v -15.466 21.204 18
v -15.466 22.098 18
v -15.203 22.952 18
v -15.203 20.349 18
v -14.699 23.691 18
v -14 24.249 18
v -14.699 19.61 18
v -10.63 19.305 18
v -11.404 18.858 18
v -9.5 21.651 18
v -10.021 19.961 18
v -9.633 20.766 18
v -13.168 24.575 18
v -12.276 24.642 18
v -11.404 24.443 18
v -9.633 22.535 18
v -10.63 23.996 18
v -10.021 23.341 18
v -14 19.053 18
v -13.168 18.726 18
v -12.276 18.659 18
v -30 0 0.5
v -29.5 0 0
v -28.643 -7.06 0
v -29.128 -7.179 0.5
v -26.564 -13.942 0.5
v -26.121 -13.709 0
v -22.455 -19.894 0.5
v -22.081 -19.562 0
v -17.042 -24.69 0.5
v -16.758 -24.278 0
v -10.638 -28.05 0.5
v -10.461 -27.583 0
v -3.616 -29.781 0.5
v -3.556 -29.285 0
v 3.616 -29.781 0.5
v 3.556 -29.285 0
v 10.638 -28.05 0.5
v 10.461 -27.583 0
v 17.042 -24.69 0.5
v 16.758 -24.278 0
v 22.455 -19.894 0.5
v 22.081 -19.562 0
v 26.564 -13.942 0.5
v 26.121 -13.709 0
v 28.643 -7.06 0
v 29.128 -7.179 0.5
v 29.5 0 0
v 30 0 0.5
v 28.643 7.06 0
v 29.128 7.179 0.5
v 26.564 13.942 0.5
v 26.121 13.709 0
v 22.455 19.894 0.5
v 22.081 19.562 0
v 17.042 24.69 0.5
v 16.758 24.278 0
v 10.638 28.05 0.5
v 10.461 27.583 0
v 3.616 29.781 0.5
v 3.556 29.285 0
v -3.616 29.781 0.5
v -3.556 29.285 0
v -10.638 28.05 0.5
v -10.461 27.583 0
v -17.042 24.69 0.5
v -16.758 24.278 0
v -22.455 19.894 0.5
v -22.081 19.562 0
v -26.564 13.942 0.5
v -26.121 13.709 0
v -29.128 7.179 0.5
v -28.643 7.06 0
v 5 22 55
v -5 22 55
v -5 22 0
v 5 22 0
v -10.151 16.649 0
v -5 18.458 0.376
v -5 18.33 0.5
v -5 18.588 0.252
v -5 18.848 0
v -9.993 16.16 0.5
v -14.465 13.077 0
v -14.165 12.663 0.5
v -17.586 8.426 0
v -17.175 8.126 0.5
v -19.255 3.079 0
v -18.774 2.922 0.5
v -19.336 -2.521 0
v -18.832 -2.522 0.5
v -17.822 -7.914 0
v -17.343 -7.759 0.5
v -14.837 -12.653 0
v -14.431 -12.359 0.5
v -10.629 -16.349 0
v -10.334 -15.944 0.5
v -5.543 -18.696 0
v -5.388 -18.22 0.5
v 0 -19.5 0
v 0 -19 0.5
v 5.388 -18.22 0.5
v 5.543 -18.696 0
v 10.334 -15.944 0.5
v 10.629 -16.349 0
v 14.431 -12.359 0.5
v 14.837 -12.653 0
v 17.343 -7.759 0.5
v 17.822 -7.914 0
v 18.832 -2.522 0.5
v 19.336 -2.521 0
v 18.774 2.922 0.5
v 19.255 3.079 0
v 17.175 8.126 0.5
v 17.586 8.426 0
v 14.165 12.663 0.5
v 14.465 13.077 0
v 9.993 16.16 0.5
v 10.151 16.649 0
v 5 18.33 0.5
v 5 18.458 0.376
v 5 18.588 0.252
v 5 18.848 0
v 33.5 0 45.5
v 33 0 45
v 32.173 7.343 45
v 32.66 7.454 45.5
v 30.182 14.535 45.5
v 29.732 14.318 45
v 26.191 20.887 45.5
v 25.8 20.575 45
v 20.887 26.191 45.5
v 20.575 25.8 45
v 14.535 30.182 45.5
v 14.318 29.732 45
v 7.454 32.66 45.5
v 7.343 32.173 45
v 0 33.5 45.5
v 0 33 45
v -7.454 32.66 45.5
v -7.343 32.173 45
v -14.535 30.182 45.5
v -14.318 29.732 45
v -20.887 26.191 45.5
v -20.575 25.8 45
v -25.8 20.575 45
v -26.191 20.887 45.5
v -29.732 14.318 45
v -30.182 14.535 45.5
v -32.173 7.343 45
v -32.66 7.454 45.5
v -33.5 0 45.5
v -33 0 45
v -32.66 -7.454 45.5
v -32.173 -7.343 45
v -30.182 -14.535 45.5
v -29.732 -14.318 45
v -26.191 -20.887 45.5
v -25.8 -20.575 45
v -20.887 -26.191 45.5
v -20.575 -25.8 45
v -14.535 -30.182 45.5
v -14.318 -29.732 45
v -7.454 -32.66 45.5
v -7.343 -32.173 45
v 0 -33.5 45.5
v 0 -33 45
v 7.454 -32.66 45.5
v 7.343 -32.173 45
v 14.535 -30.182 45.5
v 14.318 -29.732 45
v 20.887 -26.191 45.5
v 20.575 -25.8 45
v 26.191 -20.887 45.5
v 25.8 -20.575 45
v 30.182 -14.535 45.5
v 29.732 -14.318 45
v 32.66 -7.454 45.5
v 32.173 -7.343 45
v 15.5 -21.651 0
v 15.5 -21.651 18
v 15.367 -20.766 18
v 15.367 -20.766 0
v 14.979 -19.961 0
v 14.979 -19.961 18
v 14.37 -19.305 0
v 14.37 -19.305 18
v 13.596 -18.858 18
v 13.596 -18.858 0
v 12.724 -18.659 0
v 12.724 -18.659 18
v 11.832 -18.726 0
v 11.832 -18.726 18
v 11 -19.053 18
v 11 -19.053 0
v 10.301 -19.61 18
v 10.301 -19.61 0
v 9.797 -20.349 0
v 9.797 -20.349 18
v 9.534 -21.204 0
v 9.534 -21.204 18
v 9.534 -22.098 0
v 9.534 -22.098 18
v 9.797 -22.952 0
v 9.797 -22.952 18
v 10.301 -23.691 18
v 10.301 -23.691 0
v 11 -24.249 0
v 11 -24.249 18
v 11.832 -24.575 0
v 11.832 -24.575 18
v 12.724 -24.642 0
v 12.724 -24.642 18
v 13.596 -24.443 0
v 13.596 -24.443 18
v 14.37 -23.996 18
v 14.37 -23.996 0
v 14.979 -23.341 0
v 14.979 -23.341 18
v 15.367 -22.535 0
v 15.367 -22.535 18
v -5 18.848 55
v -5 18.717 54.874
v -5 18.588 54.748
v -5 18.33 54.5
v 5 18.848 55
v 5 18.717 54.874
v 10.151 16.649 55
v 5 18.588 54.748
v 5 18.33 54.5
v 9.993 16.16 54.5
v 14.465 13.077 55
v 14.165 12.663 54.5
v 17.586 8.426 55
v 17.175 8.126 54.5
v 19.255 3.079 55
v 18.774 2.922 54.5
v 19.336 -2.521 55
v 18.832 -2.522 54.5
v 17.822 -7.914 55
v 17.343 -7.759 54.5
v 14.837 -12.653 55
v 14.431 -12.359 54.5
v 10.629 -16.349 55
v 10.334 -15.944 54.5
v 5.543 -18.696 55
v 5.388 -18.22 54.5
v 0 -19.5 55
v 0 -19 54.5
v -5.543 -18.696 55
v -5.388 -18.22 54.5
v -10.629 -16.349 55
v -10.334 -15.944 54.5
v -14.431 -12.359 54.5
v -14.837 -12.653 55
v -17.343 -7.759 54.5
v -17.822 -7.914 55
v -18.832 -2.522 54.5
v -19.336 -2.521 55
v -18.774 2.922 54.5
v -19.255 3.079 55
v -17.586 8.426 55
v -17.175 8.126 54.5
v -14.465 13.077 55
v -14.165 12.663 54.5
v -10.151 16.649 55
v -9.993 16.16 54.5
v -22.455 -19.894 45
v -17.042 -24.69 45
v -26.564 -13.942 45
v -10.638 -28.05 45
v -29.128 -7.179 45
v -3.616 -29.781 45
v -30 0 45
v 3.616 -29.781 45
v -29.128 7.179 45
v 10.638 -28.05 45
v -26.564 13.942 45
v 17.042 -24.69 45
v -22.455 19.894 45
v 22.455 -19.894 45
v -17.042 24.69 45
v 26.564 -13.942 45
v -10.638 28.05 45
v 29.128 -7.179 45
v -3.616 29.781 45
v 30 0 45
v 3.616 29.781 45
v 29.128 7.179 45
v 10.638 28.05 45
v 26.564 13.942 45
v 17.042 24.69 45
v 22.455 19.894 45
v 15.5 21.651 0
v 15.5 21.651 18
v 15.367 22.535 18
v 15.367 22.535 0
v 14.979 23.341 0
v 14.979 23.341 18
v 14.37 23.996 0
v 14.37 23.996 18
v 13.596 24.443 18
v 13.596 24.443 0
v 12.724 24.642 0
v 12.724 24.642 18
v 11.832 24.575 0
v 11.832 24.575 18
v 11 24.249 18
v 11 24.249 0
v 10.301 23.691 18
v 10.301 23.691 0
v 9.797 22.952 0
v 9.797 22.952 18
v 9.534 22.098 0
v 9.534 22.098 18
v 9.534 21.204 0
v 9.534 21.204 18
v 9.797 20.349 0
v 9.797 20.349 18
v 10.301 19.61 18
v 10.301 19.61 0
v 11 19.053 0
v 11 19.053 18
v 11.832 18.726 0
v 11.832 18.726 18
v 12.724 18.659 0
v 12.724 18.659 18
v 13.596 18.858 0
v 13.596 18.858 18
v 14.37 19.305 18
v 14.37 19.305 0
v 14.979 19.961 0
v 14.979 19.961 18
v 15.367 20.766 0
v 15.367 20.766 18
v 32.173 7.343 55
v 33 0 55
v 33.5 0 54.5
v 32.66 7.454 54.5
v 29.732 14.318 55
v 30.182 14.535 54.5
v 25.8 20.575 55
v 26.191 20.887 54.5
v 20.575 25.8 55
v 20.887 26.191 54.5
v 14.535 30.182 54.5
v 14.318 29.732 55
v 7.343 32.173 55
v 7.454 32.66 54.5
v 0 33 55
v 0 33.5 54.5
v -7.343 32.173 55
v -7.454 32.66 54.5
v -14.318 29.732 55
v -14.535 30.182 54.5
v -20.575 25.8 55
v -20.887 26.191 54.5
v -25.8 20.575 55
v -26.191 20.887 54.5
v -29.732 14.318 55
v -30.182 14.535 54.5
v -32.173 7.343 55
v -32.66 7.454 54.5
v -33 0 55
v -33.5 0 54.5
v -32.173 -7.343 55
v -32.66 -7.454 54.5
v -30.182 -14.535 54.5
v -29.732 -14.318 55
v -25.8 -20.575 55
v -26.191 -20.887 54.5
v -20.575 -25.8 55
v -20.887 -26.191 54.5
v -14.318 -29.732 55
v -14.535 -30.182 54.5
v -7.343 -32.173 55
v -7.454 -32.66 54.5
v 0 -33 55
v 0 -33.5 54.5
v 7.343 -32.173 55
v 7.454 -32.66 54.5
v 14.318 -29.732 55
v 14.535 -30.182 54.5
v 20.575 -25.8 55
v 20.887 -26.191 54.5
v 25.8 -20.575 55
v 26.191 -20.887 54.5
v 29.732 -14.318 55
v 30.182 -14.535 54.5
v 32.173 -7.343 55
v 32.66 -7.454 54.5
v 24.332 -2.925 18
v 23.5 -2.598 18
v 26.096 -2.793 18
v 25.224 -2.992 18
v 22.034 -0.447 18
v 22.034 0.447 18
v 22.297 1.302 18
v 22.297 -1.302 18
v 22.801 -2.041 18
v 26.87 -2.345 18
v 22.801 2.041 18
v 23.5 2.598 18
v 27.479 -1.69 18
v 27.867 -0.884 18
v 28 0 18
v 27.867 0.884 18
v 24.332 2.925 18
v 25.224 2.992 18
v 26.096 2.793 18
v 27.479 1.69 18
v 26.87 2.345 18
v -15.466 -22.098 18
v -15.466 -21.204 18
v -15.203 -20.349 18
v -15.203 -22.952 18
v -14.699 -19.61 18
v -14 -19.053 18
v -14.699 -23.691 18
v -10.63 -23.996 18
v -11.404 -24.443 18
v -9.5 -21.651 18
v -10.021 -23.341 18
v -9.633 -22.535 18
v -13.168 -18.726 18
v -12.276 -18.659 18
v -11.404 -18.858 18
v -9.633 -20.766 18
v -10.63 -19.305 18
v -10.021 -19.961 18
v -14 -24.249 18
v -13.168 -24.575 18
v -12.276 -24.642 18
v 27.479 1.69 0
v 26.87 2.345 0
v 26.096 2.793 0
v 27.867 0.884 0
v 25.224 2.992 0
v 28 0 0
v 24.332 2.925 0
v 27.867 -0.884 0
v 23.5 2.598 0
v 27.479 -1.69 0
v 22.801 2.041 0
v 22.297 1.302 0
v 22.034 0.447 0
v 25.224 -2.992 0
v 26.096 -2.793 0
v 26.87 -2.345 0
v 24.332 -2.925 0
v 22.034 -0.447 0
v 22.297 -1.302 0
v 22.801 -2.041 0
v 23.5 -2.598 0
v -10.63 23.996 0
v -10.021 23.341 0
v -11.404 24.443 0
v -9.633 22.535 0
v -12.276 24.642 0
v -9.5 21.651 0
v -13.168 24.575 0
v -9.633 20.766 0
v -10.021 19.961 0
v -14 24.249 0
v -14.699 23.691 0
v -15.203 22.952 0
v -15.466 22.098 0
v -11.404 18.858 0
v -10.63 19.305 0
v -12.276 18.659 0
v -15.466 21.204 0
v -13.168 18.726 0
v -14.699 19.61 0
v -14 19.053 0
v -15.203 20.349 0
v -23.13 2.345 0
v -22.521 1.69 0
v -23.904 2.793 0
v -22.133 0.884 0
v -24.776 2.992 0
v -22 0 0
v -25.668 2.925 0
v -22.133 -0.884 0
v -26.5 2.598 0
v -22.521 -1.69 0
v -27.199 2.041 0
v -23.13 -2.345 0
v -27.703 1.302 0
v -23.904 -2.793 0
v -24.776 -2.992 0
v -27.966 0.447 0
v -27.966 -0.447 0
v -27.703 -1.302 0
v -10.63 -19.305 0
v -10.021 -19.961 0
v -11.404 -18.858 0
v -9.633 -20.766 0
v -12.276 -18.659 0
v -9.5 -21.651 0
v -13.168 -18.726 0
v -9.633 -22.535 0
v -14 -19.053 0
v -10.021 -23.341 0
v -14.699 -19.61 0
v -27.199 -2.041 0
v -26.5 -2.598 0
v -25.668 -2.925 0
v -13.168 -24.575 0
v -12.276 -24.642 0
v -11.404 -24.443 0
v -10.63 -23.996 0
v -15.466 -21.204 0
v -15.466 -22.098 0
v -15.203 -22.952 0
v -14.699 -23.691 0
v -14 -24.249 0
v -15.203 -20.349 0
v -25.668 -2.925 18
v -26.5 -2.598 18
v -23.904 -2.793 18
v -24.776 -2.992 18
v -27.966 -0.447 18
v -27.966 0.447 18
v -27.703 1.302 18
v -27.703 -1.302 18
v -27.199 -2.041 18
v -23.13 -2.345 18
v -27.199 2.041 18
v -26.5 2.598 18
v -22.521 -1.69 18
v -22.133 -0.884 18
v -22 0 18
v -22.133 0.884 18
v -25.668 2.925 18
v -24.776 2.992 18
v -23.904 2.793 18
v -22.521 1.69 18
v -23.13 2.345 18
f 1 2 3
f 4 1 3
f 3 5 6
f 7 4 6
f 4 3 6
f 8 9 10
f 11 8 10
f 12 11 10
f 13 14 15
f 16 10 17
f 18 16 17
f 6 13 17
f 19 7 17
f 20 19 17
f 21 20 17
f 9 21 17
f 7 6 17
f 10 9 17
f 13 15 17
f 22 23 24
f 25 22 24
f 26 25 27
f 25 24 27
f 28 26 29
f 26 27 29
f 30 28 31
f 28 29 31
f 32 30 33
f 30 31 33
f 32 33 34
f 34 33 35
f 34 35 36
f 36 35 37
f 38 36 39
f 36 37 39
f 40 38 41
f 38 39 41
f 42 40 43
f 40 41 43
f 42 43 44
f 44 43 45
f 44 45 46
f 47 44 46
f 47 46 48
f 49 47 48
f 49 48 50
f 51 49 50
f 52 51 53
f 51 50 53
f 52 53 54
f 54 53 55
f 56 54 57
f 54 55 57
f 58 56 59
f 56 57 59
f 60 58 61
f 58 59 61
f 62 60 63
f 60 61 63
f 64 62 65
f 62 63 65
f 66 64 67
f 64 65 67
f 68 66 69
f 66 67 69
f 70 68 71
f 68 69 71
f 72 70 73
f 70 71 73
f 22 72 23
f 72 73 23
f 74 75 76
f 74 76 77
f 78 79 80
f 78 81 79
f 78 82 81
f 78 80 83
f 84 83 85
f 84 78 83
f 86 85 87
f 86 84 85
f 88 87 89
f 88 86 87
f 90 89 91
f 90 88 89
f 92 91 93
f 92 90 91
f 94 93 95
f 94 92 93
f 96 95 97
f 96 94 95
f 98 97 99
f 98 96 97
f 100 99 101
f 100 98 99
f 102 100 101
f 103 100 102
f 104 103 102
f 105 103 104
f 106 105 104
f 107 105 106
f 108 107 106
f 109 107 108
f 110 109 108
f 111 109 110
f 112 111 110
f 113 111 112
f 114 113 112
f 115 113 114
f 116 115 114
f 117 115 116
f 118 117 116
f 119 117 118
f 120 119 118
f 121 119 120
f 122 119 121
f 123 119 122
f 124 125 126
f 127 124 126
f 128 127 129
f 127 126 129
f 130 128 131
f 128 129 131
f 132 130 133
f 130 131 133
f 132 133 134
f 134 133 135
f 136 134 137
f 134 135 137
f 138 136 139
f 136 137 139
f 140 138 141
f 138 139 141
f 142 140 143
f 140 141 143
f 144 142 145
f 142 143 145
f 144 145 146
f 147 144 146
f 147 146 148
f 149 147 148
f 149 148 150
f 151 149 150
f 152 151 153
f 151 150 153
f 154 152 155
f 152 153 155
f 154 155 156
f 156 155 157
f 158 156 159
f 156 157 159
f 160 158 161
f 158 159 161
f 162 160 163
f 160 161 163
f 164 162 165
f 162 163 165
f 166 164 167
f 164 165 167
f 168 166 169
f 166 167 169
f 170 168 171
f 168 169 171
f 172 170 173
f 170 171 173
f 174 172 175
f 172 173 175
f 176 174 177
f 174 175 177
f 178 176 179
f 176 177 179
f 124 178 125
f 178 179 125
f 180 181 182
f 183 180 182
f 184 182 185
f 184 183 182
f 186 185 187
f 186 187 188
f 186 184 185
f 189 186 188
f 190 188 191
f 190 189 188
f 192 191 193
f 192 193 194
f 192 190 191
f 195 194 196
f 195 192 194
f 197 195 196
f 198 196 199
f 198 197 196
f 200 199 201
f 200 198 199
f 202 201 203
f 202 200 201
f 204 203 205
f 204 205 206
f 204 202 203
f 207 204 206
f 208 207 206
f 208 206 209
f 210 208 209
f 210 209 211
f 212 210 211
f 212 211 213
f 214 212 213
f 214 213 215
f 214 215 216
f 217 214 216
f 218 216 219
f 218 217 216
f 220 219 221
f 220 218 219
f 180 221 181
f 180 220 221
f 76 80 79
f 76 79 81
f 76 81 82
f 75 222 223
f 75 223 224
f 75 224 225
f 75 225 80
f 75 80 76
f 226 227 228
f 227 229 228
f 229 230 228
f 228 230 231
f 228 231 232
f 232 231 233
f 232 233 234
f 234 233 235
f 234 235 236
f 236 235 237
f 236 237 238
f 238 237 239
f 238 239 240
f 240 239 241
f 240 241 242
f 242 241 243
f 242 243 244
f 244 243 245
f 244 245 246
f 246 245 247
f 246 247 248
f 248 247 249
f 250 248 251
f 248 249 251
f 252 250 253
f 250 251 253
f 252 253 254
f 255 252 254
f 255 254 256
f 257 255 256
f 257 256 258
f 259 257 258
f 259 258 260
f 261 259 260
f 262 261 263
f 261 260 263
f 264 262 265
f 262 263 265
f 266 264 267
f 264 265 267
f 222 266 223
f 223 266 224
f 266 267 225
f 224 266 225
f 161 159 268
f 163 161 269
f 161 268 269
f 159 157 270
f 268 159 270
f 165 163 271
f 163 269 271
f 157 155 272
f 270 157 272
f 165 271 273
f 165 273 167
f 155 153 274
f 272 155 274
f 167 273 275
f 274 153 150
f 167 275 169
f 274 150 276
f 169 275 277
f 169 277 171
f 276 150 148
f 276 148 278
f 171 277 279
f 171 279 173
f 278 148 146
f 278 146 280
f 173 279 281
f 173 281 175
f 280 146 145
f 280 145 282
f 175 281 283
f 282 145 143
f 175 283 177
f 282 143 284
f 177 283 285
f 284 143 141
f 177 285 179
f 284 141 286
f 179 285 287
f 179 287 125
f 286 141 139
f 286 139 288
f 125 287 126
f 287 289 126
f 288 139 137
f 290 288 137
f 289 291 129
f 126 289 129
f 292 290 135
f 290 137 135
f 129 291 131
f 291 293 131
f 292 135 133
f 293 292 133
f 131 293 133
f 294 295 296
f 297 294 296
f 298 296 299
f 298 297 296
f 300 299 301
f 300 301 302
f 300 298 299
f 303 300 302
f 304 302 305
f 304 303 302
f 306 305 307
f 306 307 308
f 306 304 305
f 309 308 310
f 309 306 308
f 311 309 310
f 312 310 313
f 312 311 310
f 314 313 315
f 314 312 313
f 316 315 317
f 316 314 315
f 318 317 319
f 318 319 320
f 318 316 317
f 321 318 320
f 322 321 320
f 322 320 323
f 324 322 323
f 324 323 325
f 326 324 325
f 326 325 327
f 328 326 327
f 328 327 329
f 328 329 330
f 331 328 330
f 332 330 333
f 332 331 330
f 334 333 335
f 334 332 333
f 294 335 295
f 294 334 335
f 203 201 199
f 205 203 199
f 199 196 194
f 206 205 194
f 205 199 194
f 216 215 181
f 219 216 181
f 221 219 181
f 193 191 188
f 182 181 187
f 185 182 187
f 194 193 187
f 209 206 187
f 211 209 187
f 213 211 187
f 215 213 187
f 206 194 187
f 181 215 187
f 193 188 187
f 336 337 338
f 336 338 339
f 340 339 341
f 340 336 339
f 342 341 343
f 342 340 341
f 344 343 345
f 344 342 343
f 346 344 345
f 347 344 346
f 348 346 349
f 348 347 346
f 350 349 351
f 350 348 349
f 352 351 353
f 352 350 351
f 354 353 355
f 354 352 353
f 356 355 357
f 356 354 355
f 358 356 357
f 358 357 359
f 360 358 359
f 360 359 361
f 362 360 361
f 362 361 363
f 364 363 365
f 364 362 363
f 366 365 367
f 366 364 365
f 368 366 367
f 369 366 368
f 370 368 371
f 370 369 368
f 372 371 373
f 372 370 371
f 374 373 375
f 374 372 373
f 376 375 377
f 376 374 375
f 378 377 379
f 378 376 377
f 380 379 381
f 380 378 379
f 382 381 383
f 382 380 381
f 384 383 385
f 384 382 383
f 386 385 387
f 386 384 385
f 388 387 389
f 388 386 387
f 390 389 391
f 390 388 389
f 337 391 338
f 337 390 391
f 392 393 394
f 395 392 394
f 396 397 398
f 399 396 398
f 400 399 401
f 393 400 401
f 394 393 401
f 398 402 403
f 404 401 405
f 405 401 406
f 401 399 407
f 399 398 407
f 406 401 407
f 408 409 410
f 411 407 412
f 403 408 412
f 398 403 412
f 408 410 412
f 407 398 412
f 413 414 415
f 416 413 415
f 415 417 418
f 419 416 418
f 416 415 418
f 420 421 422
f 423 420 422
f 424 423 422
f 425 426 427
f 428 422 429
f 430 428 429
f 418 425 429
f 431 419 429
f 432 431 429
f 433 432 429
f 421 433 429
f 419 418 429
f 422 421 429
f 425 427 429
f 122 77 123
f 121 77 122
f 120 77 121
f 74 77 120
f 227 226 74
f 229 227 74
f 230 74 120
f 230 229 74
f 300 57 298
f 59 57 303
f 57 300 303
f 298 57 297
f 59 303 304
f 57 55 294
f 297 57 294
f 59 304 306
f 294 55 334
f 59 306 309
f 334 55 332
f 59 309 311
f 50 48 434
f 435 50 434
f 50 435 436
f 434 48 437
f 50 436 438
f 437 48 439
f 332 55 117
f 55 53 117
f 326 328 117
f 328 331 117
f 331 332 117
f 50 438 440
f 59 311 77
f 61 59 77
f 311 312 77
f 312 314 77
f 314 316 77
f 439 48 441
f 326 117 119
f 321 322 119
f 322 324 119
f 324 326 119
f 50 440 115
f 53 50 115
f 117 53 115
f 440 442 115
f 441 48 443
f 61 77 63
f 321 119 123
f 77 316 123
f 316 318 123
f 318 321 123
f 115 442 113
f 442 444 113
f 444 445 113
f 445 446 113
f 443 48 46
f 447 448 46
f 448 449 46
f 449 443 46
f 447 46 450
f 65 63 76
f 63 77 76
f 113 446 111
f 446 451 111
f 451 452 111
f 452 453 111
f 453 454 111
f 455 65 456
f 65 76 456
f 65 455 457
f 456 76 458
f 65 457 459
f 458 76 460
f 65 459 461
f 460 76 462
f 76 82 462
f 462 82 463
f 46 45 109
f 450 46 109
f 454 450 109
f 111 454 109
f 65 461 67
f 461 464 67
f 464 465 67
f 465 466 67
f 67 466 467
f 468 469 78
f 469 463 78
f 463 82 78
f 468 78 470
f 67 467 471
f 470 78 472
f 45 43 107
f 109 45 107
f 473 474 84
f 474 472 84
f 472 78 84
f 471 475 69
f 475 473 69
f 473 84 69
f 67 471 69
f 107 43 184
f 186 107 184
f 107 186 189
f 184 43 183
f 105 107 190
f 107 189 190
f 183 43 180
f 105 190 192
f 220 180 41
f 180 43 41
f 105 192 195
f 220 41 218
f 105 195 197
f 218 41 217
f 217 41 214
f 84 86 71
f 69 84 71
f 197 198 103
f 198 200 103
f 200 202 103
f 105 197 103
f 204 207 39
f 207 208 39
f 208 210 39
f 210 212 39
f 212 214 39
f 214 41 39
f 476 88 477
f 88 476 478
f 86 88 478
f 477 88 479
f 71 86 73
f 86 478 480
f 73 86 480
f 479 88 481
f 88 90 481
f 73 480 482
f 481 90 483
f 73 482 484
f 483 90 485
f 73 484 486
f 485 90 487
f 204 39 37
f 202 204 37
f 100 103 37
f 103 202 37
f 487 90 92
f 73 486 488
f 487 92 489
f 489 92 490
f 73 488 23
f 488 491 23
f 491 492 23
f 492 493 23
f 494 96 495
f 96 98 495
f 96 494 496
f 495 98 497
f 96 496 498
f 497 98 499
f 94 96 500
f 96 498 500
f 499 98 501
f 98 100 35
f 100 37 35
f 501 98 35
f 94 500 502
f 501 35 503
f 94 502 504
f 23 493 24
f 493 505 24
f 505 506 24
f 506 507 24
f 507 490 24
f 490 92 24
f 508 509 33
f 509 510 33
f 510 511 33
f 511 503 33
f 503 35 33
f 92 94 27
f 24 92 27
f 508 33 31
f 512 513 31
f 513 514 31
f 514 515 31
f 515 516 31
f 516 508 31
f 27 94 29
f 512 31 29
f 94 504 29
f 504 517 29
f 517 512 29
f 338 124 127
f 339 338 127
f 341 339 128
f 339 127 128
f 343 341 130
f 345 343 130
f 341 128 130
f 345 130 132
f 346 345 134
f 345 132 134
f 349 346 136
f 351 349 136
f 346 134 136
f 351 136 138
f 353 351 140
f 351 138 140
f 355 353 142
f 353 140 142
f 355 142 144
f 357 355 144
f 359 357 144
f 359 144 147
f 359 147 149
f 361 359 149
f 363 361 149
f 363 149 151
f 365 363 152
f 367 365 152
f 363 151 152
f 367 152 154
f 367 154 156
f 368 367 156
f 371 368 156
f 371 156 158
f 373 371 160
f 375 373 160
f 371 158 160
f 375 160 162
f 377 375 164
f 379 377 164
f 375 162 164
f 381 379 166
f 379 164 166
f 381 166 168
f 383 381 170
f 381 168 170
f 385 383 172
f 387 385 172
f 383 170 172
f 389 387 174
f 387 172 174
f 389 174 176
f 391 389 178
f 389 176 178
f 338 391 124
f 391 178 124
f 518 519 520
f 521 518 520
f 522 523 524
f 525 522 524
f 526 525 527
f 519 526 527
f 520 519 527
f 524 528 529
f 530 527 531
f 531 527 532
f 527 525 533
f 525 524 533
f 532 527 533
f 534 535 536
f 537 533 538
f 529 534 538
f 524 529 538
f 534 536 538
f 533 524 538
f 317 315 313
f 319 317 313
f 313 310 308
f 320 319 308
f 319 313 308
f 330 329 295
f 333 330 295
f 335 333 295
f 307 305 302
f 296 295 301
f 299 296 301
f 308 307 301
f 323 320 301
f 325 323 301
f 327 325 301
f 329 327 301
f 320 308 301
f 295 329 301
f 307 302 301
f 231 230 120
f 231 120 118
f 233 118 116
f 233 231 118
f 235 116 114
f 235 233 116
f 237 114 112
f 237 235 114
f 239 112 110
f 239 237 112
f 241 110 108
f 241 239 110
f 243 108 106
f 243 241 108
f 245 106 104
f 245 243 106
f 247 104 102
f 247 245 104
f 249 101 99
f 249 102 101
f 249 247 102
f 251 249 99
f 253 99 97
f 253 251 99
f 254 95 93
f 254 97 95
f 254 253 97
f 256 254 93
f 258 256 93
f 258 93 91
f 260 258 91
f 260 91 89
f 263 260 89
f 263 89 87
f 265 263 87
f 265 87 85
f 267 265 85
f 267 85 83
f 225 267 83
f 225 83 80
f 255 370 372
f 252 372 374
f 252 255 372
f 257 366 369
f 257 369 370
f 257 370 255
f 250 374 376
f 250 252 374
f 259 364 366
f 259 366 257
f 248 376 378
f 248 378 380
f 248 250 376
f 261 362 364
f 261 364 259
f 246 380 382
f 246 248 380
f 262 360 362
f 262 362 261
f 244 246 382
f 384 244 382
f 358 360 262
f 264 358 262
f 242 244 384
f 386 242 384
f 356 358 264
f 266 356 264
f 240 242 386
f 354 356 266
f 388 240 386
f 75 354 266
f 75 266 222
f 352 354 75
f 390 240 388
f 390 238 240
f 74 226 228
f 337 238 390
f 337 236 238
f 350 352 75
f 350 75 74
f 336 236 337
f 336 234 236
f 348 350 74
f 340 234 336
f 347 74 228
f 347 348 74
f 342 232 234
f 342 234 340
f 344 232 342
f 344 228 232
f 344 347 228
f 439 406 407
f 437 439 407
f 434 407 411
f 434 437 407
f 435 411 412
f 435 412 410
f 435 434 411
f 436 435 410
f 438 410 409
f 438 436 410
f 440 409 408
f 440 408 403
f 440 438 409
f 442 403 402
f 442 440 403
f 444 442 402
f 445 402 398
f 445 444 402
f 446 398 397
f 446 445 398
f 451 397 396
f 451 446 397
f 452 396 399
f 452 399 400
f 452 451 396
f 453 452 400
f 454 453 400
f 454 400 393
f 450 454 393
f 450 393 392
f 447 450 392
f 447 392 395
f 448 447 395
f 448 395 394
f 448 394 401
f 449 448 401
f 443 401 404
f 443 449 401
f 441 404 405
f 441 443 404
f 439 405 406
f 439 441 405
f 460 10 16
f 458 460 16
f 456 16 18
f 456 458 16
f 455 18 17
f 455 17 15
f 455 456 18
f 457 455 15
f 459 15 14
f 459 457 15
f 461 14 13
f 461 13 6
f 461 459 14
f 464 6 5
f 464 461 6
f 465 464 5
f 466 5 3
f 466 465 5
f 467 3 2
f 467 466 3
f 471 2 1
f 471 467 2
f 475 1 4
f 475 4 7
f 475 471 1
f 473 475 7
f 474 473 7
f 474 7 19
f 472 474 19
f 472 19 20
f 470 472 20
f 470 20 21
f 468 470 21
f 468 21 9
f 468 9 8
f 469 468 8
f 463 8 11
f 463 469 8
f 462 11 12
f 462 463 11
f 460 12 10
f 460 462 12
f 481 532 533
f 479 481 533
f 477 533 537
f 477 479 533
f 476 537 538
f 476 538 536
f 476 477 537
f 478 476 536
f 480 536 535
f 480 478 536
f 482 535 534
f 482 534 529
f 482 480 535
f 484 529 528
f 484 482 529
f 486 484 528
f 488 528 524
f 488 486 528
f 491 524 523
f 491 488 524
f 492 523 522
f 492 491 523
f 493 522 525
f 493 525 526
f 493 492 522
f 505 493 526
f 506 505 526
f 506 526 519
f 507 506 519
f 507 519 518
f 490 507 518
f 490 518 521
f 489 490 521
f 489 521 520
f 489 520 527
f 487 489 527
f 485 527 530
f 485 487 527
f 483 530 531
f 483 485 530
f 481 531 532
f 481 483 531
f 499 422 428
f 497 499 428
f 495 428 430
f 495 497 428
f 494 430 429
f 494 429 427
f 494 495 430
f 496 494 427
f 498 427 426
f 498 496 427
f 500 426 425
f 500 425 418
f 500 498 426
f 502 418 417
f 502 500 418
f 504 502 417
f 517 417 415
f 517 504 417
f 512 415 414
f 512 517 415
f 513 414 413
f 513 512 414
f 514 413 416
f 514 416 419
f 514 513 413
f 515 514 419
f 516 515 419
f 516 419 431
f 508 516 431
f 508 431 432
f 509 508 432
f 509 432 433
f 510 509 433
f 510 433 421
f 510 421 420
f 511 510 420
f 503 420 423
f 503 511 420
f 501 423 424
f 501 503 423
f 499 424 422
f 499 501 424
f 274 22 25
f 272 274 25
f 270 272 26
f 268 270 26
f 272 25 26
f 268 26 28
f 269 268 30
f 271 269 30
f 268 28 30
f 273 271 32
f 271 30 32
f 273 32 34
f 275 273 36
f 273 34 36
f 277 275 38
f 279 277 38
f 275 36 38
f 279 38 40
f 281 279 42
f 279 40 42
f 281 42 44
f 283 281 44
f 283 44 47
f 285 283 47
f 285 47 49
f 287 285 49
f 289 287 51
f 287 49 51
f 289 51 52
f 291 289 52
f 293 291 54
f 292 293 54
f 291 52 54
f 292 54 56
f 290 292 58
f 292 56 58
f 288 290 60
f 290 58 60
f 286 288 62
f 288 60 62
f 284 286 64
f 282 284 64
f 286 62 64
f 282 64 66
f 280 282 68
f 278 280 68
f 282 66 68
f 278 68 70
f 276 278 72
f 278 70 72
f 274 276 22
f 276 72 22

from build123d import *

# Parameters (mm, degrees)
SKETCH_1_R          = 30
EXTRUDE_1_DEPTH     = 45
SKETCH_3_R          = 33.5
EXTRUDE_2_DEPTH     = 10
CUT_EXTRUDE_1_DEPTH = 73.591321795
SKETCH_5_R          = 3
CUT_EXTRUDE_2_DEPTH = 18
CHAMFER_1_SIZE      = 0.5


with BuildPart() as part:
    # 草图1 → 凸台-拉伸1 (new body)
    with BuildSketch(Plane.XY):
        with Locations(Location((0, 0, 0), (0, 0, 180))):
            Circle(SKETCH_1_R)
    extrude(amount=EXTRUDE_1_DEPTH)

    # 草图3 → 凸台-拉伸2 (add)
    with BuildSketch(Plane.XY.offset(45)):
        Circle(SKETCH_3_R)
    extrude(amount=EXTRUDE_2_DEPTH)

    # 草图4 → 切除-拉伸1 (cut, through all)
    with BuildSketch(Plane.XY.offset(55)):
        with BuildLine():
            Line((-5, 18.33030278), (-5, 22))
            Line((-5, 22), (5, 22))
            Line((5, 22), (5, 18.33030278))
            ThreePointArc((5, 18.33030278), (0, -19), (-5, 18.33030278))
        make_face()
    extrude(amount=-CUT_EXTRUDE_1_DEPTH, mode=Mode.SUBTRACT)

    # 草图5 → 切除-拉伸2 (cut)
    with BuildSketch(Plane.XY):
        with Locations((-12.5, 21.650635095)):
            Circle(SKETCH_5_R)
        with Locations((12.5, 21.650635095)):
            Circle(SKETCH_5_R)
        with Locations((25, 0)):
            Circle(SKETCH_5_R)
        with Locations((12.5, -21.650635095)):
            Circle(SKETCH_5_R)
        with Locations((-12.5, -21.650635095)):
            Circle(SKETCH_5_R)
        with Locations((-25, 0)):
            Circle(SKETCH_5_R)
    extrude(amount=CUT_EXTRUDE_2_DEPTH, mode=Mode.SUBTRACT)

    # 倒角1
    chamfer_1_edges = [part.edges().sort_by_distance(p)[0] for p in [
        (0, -19, 0),
        (0, -19, 55),
        (30, 0, 0),
        (-33.5, 0, 45),
        (-33.5, 0, 55),
    ]]
    chamfer(chamfer_1_edges, length=CHAMFER_1_SIZE)


solid = part.part
